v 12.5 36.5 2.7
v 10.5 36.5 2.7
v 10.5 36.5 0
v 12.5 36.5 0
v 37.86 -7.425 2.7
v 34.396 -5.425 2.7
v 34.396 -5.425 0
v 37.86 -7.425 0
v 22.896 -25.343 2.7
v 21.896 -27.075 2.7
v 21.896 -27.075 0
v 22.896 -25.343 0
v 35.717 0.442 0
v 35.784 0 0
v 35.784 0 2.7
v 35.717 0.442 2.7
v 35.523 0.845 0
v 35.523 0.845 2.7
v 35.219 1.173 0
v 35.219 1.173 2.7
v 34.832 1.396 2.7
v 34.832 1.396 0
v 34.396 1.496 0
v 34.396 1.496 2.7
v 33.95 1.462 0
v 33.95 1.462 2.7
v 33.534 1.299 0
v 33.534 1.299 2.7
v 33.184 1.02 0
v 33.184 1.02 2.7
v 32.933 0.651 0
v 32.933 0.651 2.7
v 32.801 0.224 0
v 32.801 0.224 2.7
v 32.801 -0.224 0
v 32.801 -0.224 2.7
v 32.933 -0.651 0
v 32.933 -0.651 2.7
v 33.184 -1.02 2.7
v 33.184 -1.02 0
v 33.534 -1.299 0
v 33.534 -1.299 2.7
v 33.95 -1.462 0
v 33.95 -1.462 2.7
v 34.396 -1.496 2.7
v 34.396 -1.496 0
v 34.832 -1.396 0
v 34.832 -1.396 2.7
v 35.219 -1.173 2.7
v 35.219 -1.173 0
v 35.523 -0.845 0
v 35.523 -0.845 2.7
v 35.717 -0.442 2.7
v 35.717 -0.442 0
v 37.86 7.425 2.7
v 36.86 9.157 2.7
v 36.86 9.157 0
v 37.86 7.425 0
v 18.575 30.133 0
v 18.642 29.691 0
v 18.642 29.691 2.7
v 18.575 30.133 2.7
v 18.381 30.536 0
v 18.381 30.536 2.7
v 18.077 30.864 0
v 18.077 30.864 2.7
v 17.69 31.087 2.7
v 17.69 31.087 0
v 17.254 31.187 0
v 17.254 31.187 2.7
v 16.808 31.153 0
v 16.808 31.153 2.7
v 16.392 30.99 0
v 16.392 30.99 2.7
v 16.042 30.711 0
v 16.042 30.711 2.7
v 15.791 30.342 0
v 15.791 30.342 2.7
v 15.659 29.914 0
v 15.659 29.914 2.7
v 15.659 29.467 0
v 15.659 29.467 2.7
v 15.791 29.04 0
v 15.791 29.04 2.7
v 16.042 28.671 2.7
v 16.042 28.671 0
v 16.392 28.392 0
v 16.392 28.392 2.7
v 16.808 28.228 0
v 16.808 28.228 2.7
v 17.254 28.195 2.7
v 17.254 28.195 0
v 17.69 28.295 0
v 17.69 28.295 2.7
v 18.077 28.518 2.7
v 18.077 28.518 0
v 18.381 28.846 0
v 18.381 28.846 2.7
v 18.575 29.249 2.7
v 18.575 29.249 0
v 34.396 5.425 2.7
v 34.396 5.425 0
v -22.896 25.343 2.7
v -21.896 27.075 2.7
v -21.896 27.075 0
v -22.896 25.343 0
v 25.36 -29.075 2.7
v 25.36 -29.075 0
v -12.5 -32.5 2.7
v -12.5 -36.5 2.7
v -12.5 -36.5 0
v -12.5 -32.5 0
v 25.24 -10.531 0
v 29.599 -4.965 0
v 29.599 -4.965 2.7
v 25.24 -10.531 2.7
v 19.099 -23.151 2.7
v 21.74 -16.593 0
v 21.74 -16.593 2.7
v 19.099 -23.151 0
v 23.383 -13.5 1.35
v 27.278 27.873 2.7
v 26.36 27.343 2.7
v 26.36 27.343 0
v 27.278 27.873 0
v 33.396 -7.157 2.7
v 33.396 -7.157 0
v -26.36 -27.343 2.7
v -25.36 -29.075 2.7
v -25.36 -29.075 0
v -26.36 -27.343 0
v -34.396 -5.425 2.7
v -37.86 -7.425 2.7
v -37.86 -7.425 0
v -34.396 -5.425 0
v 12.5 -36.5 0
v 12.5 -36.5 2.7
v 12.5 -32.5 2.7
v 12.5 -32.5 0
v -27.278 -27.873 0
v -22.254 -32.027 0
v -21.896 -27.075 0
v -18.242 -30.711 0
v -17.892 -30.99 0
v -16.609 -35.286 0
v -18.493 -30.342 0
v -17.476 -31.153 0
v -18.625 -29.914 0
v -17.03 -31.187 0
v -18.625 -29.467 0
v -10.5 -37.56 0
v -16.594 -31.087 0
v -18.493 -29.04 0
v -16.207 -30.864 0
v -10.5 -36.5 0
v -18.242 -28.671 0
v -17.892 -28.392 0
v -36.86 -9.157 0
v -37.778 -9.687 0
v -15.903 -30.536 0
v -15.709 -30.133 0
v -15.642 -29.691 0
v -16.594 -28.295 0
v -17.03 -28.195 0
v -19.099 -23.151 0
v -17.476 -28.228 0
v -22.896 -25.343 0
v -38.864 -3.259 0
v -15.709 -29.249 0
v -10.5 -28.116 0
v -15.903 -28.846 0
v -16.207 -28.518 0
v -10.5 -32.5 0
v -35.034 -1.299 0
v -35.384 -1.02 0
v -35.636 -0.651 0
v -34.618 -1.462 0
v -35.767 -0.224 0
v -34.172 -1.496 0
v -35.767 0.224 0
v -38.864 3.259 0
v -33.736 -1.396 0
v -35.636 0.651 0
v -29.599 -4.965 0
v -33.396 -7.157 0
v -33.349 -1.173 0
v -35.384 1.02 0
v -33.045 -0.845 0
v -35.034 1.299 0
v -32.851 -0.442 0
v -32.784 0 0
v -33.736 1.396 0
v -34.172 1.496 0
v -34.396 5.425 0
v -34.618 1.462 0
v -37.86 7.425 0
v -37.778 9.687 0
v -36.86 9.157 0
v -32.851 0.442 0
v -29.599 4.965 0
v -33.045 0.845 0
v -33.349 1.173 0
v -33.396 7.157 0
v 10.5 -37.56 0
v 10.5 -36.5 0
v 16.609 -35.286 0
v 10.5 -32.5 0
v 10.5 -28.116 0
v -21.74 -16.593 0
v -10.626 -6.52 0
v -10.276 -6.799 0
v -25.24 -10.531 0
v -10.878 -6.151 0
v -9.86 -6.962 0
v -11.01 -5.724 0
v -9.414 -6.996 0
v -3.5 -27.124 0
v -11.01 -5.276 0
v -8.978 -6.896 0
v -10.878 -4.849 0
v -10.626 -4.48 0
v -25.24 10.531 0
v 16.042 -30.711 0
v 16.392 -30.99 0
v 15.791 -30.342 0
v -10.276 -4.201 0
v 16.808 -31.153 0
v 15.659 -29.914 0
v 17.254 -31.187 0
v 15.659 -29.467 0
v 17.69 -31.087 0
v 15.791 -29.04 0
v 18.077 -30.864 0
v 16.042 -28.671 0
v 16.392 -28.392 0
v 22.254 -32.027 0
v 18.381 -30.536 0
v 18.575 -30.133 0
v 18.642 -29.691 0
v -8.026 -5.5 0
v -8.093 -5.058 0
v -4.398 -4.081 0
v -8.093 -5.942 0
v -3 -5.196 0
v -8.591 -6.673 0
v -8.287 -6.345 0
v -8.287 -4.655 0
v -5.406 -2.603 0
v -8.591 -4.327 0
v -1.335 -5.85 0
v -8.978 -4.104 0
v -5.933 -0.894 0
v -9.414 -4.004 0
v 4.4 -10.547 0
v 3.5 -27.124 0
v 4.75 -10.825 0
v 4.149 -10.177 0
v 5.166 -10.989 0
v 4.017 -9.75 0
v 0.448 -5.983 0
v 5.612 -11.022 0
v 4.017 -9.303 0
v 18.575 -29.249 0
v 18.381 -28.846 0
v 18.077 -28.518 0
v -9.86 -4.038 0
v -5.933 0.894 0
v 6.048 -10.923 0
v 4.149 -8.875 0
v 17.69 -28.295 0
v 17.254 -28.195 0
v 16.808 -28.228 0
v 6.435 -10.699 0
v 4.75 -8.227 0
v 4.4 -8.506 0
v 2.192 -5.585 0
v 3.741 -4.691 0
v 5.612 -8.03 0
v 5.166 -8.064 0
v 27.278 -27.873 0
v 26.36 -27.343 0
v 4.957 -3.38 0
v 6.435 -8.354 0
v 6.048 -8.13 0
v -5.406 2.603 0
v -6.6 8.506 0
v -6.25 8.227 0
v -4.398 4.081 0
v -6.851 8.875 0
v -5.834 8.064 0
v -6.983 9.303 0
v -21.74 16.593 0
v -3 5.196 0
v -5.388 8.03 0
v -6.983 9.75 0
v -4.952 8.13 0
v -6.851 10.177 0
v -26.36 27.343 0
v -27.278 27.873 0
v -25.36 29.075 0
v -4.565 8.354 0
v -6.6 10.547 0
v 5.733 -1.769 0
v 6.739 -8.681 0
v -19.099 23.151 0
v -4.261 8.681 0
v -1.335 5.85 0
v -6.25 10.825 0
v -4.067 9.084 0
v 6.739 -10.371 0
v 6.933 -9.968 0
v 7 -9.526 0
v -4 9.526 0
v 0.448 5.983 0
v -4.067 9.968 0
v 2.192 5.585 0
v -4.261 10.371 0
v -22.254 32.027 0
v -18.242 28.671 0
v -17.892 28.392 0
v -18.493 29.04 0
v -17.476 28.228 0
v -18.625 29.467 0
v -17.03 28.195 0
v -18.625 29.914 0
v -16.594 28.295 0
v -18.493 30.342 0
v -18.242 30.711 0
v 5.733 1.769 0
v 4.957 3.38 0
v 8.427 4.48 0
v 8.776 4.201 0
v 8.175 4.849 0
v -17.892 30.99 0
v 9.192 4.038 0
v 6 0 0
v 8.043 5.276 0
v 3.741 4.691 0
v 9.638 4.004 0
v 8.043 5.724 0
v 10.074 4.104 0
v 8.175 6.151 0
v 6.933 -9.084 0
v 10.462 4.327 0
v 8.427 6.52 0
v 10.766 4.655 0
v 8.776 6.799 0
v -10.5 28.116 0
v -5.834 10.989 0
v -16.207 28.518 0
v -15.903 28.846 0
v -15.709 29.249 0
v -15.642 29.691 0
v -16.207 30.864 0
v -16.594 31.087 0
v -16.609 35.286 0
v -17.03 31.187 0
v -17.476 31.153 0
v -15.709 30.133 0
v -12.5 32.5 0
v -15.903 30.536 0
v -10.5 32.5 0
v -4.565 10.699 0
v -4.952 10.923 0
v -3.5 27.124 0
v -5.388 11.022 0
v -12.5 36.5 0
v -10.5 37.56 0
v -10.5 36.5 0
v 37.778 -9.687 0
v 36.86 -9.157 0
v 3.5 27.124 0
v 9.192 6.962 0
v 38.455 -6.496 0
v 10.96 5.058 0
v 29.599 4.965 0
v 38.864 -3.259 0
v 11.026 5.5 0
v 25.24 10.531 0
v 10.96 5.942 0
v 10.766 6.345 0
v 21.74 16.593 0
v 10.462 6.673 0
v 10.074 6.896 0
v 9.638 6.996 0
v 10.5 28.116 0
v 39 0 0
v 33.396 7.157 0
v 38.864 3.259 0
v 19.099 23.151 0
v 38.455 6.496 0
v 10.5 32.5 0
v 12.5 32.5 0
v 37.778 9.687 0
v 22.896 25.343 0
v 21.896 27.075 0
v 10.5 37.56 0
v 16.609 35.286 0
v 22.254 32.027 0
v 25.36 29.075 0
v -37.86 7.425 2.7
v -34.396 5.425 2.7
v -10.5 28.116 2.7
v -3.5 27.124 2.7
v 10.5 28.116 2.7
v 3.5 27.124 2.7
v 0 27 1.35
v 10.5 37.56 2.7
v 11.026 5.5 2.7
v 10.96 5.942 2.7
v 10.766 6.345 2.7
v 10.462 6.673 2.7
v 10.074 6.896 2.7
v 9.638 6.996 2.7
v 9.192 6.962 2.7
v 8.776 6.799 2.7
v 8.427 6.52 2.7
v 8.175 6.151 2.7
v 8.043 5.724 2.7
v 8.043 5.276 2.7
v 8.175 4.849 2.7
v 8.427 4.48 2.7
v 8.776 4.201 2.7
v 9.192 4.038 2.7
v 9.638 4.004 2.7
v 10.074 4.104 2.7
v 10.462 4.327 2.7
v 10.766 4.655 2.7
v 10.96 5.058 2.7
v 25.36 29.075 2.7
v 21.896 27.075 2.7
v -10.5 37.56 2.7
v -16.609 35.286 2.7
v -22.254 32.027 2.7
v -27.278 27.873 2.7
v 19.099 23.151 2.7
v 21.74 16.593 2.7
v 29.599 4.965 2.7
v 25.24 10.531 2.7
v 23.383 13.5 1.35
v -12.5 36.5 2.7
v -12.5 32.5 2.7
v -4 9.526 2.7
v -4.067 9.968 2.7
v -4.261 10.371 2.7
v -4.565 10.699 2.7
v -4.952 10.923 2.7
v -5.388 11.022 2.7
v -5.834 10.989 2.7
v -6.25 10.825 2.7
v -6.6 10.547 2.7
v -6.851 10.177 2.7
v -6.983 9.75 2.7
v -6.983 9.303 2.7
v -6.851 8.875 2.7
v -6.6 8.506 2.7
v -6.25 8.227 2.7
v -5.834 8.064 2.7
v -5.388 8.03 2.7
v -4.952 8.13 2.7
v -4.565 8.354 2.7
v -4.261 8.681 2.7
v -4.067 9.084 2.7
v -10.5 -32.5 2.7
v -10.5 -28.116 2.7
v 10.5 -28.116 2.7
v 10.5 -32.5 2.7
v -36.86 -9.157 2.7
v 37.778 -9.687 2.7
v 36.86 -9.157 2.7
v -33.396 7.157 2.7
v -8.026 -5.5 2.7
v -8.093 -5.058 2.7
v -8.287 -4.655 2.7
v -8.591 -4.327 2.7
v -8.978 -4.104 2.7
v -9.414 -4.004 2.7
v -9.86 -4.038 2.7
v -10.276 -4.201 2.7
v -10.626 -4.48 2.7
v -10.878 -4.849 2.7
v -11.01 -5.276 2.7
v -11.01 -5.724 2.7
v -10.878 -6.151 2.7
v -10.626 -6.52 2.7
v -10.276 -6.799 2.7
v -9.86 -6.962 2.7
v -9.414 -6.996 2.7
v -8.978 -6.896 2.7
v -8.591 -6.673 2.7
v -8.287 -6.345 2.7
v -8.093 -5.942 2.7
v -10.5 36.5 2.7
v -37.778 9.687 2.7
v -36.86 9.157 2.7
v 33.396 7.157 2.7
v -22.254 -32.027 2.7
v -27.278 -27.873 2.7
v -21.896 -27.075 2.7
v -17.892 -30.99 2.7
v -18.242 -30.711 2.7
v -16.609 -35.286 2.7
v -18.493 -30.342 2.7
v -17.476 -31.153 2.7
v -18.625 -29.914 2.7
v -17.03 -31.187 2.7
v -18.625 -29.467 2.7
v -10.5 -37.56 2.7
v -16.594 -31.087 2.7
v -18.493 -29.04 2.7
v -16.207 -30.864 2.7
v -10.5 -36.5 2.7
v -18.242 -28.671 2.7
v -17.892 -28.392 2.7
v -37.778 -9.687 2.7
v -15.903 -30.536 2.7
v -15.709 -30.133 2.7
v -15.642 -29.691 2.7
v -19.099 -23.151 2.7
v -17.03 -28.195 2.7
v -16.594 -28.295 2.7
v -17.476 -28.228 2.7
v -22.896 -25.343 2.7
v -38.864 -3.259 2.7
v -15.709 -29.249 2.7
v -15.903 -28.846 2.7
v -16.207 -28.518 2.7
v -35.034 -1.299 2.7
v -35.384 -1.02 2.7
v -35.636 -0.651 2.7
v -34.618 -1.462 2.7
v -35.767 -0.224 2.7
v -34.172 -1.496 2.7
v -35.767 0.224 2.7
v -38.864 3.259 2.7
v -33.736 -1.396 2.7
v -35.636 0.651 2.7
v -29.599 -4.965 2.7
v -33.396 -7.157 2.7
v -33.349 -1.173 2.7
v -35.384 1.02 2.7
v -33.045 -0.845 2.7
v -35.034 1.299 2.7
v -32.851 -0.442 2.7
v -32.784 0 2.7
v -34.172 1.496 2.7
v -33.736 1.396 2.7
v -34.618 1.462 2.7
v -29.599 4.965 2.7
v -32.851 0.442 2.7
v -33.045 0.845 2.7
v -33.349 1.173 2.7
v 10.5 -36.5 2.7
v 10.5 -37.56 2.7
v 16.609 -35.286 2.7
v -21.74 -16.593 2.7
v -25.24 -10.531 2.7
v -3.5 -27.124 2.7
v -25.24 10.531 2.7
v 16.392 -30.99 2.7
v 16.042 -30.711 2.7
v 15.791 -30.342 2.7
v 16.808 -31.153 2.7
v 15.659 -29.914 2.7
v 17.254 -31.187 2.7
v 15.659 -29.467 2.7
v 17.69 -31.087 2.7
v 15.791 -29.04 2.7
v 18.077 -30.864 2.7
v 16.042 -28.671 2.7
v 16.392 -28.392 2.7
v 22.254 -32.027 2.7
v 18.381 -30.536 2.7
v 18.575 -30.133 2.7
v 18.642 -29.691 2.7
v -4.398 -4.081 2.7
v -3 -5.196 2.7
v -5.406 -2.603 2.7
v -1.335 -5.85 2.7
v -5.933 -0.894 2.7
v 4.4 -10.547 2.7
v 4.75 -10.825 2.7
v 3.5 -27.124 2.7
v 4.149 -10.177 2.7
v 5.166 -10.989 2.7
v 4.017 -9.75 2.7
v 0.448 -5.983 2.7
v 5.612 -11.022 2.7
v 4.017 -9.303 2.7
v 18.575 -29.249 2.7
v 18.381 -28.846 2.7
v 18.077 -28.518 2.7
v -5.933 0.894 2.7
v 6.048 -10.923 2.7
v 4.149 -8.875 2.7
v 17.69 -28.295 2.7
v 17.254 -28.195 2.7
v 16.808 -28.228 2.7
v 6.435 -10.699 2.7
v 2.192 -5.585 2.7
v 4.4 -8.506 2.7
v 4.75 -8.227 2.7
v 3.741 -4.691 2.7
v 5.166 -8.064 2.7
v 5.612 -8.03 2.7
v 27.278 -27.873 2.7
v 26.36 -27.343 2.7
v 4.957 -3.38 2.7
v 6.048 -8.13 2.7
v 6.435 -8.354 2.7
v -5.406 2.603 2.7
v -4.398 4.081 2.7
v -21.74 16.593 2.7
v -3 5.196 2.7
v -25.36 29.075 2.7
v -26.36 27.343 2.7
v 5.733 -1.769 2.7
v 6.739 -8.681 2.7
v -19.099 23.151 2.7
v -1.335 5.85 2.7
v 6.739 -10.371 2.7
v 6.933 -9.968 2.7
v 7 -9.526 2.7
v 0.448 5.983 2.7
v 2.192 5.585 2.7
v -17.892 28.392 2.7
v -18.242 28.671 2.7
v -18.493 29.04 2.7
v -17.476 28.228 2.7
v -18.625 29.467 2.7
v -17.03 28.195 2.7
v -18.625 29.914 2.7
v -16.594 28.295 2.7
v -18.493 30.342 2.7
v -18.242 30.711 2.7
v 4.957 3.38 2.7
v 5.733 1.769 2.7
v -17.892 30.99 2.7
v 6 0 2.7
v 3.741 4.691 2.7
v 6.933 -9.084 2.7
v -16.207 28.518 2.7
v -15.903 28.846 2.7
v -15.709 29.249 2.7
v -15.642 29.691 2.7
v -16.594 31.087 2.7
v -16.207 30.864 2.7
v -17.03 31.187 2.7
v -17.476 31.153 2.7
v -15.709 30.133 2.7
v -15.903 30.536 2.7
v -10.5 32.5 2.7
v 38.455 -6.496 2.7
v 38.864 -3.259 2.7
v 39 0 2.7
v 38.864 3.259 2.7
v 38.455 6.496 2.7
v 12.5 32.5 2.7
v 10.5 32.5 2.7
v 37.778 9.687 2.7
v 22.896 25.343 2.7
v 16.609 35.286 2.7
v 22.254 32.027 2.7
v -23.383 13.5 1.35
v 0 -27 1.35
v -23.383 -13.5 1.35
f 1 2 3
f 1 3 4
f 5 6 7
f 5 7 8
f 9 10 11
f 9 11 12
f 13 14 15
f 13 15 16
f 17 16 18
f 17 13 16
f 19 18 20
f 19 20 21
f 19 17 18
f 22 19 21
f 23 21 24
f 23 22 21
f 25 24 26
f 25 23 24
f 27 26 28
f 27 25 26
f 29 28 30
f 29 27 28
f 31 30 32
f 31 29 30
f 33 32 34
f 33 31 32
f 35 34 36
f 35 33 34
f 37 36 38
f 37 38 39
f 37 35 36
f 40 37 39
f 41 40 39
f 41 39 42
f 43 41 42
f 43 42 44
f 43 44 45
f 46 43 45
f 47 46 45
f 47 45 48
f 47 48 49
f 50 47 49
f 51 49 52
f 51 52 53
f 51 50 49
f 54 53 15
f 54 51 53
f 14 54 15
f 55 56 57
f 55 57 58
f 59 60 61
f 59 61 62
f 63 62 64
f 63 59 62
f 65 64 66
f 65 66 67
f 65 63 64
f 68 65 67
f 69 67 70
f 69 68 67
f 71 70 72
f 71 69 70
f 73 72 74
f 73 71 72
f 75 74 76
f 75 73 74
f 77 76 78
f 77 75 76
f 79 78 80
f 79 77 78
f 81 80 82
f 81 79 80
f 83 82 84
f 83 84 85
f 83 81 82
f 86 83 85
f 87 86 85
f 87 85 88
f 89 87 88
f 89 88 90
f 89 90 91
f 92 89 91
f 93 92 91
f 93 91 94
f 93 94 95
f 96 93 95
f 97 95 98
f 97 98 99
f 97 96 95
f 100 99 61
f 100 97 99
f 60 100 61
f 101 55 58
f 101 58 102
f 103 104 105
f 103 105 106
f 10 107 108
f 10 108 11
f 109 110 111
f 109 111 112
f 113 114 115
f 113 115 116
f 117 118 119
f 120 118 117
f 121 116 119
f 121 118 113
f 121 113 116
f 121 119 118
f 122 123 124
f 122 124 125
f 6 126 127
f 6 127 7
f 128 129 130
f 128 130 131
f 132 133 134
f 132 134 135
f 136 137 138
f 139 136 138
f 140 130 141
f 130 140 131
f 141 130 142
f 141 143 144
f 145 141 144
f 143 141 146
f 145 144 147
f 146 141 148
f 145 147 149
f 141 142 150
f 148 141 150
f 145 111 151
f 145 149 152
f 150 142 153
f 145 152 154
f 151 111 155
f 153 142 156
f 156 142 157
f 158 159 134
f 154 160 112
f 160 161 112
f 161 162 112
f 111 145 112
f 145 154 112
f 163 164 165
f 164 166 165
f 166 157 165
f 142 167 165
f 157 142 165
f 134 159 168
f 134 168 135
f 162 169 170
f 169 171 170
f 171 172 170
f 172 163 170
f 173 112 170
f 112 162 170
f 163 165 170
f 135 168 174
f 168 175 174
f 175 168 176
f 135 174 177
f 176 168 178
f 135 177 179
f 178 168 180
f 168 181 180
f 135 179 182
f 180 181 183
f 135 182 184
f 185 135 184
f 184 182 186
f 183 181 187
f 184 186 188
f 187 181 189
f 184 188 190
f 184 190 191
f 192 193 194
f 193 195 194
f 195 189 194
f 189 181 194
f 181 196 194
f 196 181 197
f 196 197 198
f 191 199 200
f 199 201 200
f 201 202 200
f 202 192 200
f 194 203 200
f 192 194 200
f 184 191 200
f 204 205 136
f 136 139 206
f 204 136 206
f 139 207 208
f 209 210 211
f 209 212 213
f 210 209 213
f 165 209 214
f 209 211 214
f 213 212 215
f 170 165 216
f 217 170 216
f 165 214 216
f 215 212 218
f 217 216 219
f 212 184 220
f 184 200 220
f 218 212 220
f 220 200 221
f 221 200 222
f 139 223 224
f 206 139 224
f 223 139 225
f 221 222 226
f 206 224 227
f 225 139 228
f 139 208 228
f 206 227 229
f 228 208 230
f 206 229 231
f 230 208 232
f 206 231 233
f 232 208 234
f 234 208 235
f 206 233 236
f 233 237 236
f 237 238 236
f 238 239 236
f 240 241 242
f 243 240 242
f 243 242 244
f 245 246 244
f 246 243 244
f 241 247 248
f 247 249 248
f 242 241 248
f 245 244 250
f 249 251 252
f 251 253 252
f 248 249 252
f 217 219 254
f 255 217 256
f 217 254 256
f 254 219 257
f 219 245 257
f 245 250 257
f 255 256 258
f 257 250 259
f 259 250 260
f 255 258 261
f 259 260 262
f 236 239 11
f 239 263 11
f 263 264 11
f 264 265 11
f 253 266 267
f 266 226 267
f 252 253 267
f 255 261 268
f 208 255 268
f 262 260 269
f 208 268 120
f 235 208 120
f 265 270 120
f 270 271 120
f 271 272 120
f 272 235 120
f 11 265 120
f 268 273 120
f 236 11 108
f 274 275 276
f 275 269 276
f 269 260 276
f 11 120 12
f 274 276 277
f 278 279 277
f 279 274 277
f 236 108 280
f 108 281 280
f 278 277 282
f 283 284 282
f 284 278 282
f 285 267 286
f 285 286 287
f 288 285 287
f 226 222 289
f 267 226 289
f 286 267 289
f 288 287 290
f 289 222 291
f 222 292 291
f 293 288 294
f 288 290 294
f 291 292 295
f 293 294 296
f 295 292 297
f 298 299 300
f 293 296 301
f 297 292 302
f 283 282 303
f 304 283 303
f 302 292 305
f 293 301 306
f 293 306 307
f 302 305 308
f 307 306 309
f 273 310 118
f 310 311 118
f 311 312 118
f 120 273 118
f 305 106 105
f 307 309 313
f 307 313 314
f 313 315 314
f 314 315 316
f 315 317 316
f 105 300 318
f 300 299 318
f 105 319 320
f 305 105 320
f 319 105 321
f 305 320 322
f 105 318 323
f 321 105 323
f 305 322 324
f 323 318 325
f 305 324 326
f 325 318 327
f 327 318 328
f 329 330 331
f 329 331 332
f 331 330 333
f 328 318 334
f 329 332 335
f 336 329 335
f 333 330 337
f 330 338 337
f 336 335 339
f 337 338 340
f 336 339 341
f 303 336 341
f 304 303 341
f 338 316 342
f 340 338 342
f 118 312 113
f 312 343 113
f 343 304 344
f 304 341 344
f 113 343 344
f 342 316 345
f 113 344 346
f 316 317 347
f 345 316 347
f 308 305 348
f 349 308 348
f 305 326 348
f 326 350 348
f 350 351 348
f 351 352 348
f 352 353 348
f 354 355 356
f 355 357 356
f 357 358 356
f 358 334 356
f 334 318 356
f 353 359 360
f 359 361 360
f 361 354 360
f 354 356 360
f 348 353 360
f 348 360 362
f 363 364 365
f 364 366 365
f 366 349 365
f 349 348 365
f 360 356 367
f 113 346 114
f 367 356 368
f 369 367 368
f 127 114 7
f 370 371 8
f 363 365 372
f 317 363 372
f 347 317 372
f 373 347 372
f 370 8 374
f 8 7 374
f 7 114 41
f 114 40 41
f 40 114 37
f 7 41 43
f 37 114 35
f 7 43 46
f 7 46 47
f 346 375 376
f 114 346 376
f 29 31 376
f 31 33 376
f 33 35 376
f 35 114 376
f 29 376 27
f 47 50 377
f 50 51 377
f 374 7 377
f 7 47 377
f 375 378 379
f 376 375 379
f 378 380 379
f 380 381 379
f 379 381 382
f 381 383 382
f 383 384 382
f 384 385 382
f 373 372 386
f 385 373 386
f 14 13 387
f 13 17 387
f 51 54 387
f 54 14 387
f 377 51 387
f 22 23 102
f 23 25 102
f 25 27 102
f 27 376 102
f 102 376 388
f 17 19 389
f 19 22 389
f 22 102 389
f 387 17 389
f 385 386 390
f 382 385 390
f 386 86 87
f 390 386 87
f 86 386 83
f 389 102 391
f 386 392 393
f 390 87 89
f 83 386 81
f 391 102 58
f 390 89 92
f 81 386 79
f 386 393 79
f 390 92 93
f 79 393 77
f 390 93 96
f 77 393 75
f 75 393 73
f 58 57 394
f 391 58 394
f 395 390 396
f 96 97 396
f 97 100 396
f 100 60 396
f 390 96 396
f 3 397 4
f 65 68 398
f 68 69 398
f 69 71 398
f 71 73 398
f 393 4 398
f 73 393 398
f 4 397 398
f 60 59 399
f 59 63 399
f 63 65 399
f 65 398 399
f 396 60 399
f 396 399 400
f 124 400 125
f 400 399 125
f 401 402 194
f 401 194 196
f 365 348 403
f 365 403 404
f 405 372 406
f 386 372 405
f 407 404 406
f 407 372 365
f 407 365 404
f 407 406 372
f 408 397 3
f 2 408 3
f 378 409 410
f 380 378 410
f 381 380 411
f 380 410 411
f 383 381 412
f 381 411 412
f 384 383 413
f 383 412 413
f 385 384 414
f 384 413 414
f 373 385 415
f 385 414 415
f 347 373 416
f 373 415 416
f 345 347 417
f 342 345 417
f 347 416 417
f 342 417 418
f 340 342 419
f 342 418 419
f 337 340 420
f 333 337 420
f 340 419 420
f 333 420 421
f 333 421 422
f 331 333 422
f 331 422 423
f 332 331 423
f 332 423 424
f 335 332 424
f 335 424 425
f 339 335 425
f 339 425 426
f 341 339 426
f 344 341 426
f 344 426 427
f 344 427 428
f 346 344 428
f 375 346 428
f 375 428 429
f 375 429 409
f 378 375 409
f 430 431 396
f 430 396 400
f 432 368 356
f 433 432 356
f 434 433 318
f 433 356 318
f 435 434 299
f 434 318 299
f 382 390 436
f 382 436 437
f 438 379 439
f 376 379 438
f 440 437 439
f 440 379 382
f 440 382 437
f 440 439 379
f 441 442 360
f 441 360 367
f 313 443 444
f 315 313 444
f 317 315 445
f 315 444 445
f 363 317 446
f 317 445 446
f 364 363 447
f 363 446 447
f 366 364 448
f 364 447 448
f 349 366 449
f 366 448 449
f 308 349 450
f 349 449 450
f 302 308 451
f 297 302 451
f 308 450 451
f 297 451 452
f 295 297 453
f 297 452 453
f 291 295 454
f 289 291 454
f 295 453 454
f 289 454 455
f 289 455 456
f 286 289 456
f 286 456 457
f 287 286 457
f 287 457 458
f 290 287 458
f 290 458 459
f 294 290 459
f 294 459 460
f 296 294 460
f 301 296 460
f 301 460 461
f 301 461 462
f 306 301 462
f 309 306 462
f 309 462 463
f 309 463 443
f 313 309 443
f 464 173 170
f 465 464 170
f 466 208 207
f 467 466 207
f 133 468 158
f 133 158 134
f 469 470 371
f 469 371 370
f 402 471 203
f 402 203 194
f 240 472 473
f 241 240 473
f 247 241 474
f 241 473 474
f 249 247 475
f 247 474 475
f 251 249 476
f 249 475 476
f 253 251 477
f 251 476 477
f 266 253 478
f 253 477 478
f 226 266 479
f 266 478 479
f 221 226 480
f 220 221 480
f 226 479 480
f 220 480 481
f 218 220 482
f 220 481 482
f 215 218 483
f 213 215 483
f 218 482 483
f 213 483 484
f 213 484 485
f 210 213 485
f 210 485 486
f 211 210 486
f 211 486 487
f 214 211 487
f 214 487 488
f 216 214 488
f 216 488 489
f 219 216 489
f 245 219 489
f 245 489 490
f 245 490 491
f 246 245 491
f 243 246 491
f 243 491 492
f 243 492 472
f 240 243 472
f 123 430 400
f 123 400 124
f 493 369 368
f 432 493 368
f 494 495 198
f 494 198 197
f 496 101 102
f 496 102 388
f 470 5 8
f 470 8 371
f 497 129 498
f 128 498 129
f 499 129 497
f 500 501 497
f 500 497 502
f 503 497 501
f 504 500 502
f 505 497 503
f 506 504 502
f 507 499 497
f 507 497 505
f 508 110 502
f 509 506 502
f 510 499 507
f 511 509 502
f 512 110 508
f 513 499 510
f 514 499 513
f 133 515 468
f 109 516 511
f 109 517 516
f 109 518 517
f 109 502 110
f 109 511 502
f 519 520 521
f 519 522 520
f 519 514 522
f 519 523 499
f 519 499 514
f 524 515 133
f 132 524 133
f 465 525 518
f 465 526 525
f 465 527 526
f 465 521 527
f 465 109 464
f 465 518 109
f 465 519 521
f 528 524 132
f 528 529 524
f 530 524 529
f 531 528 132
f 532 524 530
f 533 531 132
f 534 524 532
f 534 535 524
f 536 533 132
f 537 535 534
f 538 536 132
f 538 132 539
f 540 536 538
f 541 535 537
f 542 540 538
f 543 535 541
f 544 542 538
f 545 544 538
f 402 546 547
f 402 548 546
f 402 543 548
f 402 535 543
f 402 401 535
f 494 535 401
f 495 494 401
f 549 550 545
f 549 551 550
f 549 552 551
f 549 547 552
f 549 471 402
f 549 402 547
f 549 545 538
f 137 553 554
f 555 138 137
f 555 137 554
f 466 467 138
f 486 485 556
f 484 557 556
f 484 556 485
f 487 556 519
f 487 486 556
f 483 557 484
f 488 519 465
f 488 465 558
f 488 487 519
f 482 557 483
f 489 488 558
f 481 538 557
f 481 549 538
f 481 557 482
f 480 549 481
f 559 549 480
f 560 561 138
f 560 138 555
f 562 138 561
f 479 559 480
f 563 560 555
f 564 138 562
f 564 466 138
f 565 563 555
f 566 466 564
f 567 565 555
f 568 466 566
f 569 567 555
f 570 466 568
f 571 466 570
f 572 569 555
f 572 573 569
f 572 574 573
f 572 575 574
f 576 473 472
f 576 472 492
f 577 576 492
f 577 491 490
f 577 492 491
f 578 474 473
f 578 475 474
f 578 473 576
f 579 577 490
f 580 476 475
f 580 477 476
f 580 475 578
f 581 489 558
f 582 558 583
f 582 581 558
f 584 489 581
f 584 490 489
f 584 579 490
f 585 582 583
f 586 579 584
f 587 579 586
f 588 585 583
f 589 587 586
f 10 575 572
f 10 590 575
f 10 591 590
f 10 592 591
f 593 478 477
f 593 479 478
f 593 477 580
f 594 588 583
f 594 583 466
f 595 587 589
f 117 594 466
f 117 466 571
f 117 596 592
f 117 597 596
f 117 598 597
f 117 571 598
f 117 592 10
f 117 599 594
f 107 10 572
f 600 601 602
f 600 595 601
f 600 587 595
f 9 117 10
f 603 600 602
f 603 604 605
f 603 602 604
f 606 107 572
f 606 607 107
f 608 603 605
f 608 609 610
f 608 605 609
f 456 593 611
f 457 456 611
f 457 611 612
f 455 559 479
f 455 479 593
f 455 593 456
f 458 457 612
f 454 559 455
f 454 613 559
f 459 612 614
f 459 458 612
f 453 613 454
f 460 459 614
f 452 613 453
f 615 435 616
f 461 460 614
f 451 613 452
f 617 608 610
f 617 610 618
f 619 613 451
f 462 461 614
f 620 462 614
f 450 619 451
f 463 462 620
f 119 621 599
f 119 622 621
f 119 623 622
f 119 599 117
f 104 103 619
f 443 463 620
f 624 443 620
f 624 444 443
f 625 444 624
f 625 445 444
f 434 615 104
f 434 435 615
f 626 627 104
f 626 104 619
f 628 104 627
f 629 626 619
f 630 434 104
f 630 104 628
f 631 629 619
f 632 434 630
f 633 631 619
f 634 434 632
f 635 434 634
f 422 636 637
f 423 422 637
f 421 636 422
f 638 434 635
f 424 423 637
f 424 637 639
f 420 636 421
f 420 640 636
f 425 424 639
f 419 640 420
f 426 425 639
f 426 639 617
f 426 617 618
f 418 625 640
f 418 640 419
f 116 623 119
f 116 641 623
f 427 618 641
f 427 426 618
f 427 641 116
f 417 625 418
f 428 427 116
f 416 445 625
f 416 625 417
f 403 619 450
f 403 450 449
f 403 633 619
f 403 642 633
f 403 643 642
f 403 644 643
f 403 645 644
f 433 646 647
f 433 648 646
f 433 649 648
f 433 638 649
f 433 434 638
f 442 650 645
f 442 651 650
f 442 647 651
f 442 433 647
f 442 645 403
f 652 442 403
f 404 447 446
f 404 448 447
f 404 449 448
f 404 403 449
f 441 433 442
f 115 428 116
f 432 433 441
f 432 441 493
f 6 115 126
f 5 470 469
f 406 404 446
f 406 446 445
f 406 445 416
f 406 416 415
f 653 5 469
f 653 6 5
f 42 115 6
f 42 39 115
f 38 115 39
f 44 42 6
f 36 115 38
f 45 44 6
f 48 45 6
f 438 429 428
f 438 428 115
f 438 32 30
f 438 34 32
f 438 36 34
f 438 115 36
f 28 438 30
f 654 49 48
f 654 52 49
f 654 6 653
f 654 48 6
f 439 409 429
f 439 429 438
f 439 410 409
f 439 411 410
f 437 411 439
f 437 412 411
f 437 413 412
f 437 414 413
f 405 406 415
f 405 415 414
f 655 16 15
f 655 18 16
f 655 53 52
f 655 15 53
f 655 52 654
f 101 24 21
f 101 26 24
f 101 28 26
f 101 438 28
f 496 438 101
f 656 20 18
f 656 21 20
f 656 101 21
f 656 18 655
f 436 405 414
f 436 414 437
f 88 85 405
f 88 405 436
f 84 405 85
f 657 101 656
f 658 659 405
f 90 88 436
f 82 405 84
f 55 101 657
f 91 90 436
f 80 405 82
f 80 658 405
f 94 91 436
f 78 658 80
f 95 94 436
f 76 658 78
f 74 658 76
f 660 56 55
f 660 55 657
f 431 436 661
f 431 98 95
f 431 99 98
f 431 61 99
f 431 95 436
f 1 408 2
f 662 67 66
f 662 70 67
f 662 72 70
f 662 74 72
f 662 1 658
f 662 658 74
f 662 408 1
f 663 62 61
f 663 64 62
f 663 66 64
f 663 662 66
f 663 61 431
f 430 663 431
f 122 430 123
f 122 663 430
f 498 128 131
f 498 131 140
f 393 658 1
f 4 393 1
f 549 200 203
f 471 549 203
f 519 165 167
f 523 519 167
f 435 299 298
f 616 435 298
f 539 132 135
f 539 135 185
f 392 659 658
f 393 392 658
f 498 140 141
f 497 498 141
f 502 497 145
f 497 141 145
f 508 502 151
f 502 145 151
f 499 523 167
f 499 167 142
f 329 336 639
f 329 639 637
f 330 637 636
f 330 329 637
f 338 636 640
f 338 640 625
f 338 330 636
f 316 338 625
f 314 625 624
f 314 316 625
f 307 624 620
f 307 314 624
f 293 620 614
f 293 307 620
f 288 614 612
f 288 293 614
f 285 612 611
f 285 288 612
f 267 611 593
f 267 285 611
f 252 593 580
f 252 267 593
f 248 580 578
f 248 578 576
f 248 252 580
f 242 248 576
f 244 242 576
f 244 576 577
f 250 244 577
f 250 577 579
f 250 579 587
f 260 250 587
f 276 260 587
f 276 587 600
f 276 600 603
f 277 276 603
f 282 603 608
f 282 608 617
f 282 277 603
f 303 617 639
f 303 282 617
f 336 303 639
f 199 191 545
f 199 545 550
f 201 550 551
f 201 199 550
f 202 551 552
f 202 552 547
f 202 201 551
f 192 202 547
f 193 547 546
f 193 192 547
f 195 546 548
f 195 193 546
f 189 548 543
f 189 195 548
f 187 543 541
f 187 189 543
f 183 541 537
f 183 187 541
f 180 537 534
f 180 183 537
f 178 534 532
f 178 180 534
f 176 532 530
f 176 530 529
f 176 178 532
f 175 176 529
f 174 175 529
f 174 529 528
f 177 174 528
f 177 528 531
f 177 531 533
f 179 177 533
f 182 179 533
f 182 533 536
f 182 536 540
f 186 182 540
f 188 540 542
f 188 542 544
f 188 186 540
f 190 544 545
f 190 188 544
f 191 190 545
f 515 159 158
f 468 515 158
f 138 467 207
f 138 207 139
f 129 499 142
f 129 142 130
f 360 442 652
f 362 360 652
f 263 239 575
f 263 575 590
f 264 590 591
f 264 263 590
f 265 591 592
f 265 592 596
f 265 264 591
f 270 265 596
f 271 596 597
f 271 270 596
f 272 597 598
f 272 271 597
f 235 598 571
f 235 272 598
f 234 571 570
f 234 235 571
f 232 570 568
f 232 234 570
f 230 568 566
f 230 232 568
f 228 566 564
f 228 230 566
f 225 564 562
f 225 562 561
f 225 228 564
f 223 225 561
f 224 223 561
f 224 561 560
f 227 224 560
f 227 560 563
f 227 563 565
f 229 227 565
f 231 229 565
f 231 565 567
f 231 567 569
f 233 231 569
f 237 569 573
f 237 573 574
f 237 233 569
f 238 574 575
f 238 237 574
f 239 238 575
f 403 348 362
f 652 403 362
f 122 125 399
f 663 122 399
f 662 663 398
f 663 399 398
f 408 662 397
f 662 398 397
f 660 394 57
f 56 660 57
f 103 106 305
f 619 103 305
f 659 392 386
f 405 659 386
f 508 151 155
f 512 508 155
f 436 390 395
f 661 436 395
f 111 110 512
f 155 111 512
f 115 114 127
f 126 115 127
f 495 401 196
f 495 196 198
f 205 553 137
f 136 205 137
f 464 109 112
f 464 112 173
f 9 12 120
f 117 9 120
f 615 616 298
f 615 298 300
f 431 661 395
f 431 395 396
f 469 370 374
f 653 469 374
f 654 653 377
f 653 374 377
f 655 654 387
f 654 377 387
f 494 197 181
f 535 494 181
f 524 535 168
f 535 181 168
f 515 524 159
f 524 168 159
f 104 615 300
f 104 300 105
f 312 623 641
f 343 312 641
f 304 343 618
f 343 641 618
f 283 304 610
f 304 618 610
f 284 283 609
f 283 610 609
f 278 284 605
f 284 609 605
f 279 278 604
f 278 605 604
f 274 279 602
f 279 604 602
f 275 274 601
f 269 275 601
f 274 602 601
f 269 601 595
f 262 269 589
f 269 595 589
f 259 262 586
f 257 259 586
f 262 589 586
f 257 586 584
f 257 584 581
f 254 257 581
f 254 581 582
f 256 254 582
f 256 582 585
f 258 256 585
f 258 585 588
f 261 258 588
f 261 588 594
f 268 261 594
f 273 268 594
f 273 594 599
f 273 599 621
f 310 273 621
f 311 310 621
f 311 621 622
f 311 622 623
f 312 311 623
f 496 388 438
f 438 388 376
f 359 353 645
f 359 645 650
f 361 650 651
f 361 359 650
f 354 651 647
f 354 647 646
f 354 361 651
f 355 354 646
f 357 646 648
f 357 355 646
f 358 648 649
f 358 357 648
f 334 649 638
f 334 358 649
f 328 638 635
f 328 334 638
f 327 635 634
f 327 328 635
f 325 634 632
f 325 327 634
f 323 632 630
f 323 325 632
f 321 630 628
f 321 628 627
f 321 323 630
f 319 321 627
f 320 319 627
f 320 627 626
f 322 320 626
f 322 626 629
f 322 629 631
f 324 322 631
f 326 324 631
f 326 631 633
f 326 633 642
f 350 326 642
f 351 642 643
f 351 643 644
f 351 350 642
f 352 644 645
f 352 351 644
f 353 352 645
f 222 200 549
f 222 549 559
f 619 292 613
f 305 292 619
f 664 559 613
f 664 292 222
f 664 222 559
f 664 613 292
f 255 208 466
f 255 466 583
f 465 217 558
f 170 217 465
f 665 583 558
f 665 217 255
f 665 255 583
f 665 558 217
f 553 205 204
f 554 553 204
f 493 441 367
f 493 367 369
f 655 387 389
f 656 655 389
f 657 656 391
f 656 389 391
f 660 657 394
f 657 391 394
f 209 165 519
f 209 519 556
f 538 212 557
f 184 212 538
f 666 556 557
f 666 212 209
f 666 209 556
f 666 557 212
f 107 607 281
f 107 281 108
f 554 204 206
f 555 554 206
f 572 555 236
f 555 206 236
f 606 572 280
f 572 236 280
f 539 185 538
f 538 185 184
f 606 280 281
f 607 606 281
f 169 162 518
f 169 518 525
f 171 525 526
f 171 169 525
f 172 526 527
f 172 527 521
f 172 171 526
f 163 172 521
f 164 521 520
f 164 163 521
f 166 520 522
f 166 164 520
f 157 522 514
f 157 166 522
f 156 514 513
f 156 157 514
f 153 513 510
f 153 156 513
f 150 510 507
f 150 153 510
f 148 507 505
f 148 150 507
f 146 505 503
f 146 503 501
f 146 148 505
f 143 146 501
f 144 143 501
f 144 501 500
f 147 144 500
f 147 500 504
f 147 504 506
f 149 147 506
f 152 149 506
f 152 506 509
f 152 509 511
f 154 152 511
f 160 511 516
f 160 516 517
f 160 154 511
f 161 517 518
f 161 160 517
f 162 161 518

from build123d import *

# Parameters (mm, degrees)
CROQUIS2_R                 = 1.5
CROQUIS2_R_2               = 6
SALIENTE_EXTRUIR2_DEPTH    = 2.7
CROQUIS3_R                 = 1.5
CROQUIS3_W                 = 2
CROQUIS3_H                 = 4
CORTAR_EXTRUIR1_DEPTH      = 1.0000001
CORTAR_EXTRUIR1_DEPTH_BACK = 3.7000001


with BuildPart() as part:
    # Croquis2 → Saliente-Extruir2 (new body)
    with BuildSketch(Plane.XY):
        with BuildLine():
            Line((-10.5, 28.115792599), (-10.5, 37.559952077))
            ThreePointArc((-10.5, 37.559952077), (-19.5, 33.774990748), (-27.277872663, 27.873242778))
            Line((-27.277872663, 27.873242778), (-19.098990638, 23.151163039))
            add(Edge.make_bspline(
                [(-29.598990638, 4.96462956), (-22.416381166, 12.9421037), (-19.098990638, 23.151163039)],
                knots=[0, 0, 0, 1, 1, 1], degree=2))
            Line((-29.598990638, 4.96462956), (-37.777872663, 9.686709299))
            ThreePointArc((-37.777872663, 9.686709299), (-39, 0), (-37.777872663, -9.686709299))
            Line((-37.777872663, -9.686709299), (-29.598990638, -4.96462956))
            add(Edge.make_bspline(
                [(-19.098990638, -23.151163039), (-22.416381166, -12.9421037), (-29.598990638, -4.96462956)],
                knots=[0, 0, 0, 1, 1, 1], degree=2))
            Line((-19.098990638, -23.151163039), (-27.277872663, -27.873242778))
            ThreePointArc((-27.277872663, -27.873242778), (-19.5, -33.774990748), (-10.5, -37.559952077))
            Line((-10.5, -37.559952077), (-10.5, -28.115792599))
            add(Edge.make_bspline(
                [(10.5, -28.115792599), (0, -25.884207401), (-10.5, -28.115792599)],
                knots=[0, 0, 0, 1, 1, 1], degree=2))
            Line((10.5, -28.115792599), (10.5, -37.559952077))
            ThreePointArc((10.5, -37.559952077), (19.5, -33.774990748), (27.277872663, -27.873242778))
            Line((27.277872663, -27.873242778), (19.098990638, -23.151163039))
            add(Edge.make_bspline(
                [(29.598990638, -4.96462956), (22.416381166, -12.9421037), (19.098990638, -23.151163039)],
                knots=[0, 0, 0, 1, 1, 1], degree=2))
            Line((29.598990638, -4.96462956), (37.777872663, -9.686709299))
            ThreePointArc((37.777872663, -9.686709299), (38.693261906, -4.88175), (39, 0))
            ThreePointArc((39, 0), (38.693261906, 4.88175), (37.777872663, 9.686709299))
            Line((37.777872663, 9.686709299), (29.598990638, 4.96462956))
            add(Edge.make_bspline(
                [(19.098990638, 23.151163039), (22.416381166, 12.9421037), (29.598990638, 4.96462956)],
                knots=[0, 0, 0, 1, 1, 1], degree=2))
            Line((19.098990638, 23.151163039), (27.277872663, 27.873242778))
            ThreePointArc((27.277872663, 27.873242778), (19.5, 33.774990748), (10.5, 37.559952077))
            Line((10.5, 37.559952077), (10.5, 28.115792599))
            add(Edge.make_bspline(
                [(-10.5, 28.115792599), (0, 25.884207401), (10.5, 28.115792599)],
                knots=[0, 0, 0, 1, 1, 1], degree=2))
        make_face()
        with Locations((-17.142037335, -29.69087961)):
            Circle(CROQUIS2_R, mode=Mode.SUBTRACT)
        with Locations((-34.28407467, 0)):
            Circle(CROQUIS2_R, mode=Mode.SUBTRACT)
        with Locations((17.142037335, -29.69087961)):
            Circle(CROQUIS2_R, mode=Mode.SUBTRACT)
        with Locations((-17.142037335, 29.69087961)):
            Circle(CROQUIS2_R, mode=Mode.SUBTRACT)
        Circle(CROQUIS2_R_2, mode=Mode.SUBTRACT)
        with Locations((34.28407467, 0)):
            Circle(CROQUIS2_R, mode=Mode.SUBTRACT)
        with Locations((17.142037335, 29.69087961)):
            Circle(CROQUIS2_R, mode=Mode.SUBTRACT)
    extrude(amount=SALIENTE_EXTRUIR2_DEPTH)

    # Croquis3 → Cortar-Extruir1 (cut, two sides)
    with BuildSketch(Plane.XY.offset(2.7)) as cortar_extruir1_sk:
        with Locations((9.526279442, 5.5)):
            Circle(CROQUIS3_R)
        with Locations((5.5, -9.526279442)):
            Circle(CROQUIS3_R)
        with Locations((-9.526279442, -5.5)):
            Circle(CROQUIS3_R)
        with Locations((-5.5, 9.526279442)):
            Circle(CROQUIS3_R)
        with Locations((-11.5, 34.5)):
            Rectangle(CROQUIS3_W, CROQUIS3_H)
        with Locations((11.5, 34.5)):
            Rectangle(CROQUIS3_W, CROQUIS3_H)
        Polygon((22.895825623, 25.34326674), (21.895825623, 27.075317547), (25.359927238, 29.075317547), (26.359927238, 27.34326674), align=None)
        Polygon((36.859927238, 9.15673326), (37.859927238, 7.424682453), (34.395825623, 5.424682453), (33.395825623, 7.15673326), align=None)
        Polygon((33.395825623, -7.15673326), (34.395825623, -5.424682453), (37.859927238, -7.424682453), (36.859927238, -9.15673326), align=None)
        Polygon((26.359927238, -27.34326674), (25.359927238, -29.075317547), (21.895825623, -27.075317547), (22.895825623, -25.34326674), align=None)
        with Locations((11.5, -34.5)):
            Rectangle(CROQUIS3_W, CROQUIS3_H)
        with Locations((-11.5, -34.5)):
            Rectangle(CROQUIS3_W, CROQUIS3_H)
        Polygon((-22.895825623, -25.34326674), (-21.895825623, -27.075317547), (-25.359927238, -29.075317547), (-26.359927238, -27.34326674), align=None)
        Polygon((-36.859927238, -9.15673326), (-37.859927238, -7.424682453), (-34.395825623, -5.424682453), (-33.395825623, -7.15673326), align=None)
        Polygon((-33.395825623, 7.15673326), (-34.395825623, 5.424682453), (-37.859927238, 7.424682453), (-36.859927238, 9.15673326), align=None)
        Polygon((-26.359927238, 27.34326674), (-25.359927238, 29.075317547), (-21.895825623, 27.075317547), (-22.895825623, 25.34326674), align=None)
    extrude(amount=CORTAR_EXTRUIR1_DEPTH, mode=Mode.SUBTRACT)
    extrude(cortar_extruir1_sk.sketch, amount=-CORTAR_EXTRUIR1_DEPTH_BACK, mode=Mode.SUBTRACT)


solid = part.part
